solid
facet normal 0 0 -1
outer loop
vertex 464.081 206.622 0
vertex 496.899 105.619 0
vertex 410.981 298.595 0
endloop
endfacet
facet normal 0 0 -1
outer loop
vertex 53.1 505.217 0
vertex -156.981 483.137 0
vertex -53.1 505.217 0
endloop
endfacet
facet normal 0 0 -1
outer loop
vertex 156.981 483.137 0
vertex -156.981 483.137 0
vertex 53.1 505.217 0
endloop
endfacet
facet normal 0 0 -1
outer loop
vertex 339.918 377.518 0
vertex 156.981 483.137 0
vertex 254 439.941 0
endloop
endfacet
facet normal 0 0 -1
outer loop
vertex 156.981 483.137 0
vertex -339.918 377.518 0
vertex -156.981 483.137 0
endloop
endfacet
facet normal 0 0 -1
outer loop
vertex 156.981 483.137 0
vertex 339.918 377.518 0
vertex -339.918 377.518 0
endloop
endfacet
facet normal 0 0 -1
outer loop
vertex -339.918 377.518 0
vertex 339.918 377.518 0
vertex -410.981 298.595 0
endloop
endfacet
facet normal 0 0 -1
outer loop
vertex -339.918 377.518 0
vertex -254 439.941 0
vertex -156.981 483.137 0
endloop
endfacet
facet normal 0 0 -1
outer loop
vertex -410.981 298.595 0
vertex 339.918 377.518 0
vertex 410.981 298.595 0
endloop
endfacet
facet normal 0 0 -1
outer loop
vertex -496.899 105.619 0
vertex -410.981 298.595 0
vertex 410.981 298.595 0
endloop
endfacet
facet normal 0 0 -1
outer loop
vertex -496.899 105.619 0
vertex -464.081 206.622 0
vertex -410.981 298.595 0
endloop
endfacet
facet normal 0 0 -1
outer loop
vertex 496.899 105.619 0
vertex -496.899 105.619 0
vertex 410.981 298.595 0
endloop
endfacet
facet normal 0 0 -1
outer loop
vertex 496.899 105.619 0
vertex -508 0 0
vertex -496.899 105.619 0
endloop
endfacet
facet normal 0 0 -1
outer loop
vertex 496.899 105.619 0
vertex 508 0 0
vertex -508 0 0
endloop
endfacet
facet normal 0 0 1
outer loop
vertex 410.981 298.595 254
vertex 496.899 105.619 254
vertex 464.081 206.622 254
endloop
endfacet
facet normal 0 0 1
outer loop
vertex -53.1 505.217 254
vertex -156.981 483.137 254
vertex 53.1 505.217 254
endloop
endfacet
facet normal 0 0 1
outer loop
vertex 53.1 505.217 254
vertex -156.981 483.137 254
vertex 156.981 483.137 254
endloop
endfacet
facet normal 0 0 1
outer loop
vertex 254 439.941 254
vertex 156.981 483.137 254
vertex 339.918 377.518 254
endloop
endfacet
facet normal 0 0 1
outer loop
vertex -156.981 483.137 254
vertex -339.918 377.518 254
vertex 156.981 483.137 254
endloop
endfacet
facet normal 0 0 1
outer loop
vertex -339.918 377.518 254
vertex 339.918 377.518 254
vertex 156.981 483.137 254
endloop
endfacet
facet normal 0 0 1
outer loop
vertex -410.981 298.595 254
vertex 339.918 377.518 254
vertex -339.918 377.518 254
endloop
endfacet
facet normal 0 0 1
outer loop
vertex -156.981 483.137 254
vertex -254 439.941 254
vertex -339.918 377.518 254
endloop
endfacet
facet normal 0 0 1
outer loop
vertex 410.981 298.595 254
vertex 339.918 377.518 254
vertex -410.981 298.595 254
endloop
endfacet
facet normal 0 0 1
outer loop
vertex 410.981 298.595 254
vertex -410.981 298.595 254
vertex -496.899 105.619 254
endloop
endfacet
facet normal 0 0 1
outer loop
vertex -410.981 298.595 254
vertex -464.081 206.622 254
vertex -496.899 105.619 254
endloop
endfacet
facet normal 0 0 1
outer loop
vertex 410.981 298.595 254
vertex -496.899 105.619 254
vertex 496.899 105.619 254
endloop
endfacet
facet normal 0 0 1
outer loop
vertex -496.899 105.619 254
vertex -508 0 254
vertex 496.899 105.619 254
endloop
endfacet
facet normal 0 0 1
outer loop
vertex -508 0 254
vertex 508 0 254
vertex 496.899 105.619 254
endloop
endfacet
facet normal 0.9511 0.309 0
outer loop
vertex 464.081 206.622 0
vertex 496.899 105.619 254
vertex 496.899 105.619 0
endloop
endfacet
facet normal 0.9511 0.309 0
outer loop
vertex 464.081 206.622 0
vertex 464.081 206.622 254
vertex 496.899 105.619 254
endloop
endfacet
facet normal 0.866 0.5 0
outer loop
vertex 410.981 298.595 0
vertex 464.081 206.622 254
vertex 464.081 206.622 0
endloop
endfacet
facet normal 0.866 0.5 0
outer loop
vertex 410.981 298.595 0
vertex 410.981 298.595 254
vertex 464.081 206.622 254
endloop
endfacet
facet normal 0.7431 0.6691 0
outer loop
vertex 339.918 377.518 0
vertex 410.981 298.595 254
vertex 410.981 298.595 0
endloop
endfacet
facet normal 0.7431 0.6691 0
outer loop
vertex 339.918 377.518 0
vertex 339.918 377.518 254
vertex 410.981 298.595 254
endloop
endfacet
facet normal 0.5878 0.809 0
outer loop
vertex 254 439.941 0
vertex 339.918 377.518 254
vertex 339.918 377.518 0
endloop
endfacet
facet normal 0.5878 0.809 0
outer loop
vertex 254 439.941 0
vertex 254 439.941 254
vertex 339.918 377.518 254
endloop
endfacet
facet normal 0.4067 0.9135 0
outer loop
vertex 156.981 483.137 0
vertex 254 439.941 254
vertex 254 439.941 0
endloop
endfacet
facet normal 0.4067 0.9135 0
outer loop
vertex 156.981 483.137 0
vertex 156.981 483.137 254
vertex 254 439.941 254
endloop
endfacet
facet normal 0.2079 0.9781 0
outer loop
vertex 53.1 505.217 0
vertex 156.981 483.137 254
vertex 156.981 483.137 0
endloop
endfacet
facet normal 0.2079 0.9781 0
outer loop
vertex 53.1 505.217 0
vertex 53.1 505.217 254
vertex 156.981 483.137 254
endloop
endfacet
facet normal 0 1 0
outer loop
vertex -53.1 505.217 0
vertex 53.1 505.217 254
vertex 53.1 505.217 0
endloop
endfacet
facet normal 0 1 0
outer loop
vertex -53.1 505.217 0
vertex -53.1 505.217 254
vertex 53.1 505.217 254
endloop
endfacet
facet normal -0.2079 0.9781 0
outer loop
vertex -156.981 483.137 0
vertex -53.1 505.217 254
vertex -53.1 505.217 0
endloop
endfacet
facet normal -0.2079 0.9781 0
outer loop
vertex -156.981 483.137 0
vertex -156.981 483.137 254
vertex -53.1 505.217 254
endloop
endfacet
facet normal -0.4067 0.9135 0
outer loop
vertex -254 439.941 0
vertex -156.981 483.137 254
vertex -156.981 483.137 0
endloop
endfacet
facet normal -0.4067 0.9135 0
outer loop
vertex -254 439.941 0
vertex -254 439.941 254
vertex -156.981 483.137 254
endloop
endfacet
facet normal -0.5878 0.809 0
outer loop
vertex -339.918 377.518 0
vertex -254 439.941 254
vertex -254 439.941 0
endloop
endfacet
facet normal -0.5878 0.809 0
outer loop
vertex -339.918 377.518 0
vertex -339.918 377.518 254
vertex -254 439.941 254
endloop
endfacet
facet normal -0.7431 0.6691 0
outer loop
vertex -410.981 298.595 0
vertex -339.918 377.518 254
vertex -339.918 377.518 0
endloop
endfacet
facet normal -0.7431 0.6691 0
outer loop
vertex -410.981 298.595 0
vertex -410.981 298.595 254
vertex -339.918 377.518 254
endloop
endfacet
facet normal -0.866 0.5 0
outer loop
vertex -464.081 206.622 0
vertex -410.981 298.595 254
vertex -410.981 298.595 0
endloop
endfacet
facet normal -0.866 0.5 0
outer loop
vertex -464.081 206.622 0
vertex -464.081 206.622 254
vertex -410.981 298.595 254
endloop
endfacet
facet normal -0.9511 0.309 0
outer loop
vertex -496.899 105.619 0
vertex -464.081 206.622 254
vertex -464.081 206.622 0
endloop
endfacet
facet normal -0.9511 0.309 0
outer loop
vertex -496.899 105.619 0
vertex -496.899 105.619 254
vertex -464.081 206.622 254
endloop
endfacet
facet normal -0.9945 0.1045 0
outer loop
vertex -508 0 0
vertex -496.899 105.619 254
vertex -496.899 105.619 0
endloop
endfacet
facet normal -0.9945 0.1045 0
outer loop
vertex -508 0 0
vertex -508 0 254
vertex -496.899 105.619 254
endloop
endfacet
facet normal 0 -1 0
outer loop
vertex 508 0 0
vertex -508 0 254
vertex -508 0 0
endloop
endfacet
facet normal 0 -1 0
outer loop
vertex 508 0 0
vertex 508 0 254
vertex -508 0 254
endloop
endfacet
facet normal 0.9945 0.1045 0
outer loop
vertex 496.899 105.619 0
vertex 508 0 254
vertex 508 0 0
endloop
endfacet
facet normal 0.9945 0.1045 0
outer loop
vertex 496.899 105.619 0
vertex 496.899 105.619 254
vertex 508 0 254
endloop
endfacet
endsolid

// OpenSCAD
// Unit of length: Unit.MM
linear_extrude(height = 254.0, center = false, twist = 0.0, scale = 1.0)
{
   intersection()
   {
      circle(d = 1016.0, $fa = 12.0, $fs = 50.8, $fn = 0);
      translate(v = [-508.01, 0.0])
      {
         square(size = [1016.02, 508.01], center = false);
      }
   }
}
